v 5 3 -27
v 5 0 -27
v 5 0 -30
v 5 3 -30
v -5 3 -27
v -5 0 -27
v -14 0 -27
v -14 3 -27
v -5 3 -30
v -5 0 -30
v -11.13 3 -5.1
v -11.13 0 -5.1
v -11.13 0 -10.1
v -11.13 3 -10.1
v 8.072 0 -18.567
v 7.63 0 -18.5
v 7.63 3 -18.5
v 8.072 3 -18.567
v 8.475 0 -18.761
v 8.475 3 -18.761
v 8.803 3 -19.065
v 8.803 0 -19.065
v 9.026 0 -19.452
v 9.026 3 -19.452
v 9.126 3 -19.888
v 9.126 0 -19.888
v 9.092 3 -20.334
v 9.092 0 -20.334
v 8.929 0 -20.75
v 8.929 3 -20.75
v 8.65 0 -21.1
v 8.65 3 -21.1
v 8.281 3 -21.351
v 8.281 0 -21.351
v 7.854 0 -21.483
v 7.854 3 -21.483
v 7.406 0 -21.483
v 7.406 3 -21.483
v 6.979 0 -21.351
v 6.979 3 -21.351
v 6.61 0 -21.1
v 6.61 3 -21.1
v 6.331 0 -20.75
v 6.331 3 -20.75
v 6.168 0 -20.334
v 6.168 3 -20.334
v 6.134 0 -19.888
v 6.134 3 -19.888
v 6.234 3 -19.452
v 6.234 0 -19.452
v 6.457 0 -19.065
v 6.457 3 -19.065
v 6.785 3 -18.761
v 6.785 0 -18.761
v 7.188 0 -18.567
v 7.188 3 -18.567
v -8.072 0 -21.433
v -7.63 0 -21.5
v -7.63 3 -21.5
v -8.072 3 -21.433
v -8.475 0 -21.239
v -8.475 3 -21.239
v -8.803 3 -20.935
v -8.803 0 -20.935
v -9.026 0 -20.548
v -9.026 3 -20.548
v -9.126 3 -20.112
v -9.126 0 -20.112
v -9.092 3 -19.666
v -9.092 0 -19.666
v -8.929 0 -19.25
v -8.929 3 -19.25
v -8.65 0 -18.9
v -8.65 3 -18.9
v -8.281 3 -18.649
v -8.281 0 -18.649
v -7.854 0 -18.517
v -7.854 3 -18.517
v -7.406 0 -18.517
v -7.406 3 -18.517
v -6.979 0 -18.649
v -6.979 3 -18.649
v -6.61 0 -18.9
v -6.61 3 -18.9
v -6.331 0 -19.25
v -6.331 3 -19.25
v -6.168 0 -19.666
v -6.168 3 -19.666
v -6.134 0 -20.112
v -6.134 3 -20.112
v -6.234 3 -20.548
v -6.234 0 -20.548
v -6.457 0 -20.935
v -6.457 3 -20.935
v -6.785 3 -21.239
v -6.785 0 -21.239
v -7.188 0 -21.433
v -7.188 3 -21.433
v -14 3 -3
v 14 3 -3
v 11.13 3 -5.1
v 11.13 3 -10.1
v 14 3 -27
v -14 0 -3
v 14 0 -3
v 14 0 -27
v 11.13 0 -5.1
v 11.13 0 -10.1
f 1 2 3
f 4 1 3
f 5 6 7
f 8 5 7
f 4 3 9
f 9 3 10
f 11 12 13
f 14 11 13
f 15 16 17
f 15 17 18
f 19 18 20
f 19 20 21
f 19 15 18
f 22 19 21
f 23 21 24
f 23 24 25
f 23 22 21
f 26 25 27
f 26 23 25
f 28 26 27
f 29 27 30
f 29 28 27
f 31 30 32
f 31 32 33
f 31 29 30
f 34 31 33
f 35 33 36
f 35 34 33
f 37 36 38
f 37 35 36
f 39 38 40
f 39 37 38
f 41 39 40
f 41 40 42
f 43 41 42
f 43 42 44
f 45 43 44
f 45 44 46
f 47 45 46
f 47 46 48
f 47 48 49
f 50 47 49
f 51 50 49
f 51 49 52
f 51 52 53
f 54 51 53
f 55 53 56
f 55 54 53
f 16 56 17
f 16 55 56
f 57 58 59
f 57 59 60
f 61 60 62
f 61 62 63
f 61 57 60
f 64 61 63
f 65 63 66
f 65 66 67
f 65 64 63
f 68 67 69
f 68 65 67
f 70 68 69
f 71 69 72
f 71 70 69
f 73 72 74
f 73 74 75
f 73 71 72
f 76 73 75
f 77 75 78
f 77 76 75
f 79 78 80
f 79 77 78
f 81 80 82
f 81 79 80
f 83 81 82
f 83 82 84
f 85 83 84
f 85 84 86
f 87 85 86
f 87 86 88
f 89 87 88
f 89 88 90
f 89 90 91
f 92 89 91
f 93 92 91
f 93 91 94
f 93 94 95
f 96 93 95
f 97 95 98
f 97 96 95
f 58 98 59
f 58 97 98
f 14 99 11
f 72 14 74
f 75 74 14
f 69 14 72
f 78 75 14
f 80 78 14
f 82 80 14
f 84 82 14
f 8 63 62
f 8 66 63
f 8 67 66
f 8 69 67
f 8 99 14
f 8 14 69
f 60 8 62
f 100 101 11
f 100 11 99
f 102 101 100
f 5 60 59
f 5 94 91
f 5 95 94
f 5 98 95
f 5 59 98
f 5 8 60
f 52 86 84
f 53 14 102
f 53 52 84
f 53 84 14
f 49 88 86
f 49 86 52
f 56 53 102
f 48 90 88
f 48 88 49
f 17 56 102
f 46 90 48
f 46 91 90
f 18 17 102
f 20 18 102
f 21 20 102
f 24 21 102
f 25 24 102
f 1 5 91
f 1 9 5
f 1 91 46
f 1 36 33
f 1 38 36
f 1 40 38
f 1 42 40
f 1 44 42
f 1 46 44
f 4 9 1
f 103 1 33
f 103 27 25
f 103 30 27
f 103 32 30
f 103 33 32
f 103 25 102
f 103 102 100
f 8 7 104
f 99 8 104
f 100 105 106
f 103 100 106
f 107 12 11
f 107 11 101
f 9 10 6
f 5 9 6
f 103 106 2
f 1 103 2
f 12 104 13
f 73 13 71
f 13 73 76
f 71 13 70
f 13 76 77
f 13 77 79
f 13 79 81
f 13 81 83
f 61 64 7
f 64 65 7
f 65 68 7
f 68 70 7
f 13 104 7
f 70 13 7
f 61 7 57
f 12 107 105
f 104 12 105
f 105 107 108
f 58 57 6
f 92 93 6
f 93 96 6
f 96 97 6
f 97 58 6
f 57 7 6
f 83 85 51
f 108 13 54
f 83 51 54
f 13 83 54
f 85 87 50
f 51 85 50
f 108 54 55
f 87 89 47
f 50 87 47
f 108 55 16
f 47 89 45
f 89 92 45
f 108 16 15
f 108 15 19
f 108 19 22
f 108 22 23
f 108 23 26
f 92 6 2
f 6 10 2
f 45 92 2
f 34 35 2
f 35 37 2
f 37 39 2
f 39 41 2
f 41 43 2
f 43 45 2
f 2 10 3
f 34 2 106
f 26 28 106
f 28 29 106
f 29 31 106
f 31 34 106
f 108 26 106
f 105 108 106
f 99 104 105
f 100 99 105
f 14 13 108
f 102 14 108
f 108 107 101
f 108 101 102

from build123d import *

# Parameters (mm, degrees)
SKETCH1_R           = 1.5
SKETCH1_W           = 22.26
SKETCH1_H           = 5
BOSS_EXTRUDE1_DEPTH = 3


with BuildPart() as part:
    # Sketch1 → Boss-Extrude1 (new body)
    with BuildSketch(Plane(origin=(0, 0, 0), x_dir=(1, 0, 0), z_dir=(0, 1, 0))):
        Polygon((-5, 3), (5, 3), (14, 3), (14, 27), (5, 27), (5, 30), (-5, 30), (-5, 27), (-14, 27), (-14, 3), align=None)
        with Locations(Location((7.63, 20, 0), (0, 0, 270))):
            Circle(SKETCH1_R, mode=Mode.SUBTRACT)
        with Locations(Location((-7.63, 20, 0), (0, 0, 90))):
            Circle(SKETCH1_R, mode=Mode.SUBTRACT)
        with Locations((0, 7.6)):
            Rectangle(SKETCH1_W, SKETCH1_H, mode=Mode.SUBTRACT)
    extrude(amount=BOSS_EXTRUDE1_DEPTH)


solid = part.part
